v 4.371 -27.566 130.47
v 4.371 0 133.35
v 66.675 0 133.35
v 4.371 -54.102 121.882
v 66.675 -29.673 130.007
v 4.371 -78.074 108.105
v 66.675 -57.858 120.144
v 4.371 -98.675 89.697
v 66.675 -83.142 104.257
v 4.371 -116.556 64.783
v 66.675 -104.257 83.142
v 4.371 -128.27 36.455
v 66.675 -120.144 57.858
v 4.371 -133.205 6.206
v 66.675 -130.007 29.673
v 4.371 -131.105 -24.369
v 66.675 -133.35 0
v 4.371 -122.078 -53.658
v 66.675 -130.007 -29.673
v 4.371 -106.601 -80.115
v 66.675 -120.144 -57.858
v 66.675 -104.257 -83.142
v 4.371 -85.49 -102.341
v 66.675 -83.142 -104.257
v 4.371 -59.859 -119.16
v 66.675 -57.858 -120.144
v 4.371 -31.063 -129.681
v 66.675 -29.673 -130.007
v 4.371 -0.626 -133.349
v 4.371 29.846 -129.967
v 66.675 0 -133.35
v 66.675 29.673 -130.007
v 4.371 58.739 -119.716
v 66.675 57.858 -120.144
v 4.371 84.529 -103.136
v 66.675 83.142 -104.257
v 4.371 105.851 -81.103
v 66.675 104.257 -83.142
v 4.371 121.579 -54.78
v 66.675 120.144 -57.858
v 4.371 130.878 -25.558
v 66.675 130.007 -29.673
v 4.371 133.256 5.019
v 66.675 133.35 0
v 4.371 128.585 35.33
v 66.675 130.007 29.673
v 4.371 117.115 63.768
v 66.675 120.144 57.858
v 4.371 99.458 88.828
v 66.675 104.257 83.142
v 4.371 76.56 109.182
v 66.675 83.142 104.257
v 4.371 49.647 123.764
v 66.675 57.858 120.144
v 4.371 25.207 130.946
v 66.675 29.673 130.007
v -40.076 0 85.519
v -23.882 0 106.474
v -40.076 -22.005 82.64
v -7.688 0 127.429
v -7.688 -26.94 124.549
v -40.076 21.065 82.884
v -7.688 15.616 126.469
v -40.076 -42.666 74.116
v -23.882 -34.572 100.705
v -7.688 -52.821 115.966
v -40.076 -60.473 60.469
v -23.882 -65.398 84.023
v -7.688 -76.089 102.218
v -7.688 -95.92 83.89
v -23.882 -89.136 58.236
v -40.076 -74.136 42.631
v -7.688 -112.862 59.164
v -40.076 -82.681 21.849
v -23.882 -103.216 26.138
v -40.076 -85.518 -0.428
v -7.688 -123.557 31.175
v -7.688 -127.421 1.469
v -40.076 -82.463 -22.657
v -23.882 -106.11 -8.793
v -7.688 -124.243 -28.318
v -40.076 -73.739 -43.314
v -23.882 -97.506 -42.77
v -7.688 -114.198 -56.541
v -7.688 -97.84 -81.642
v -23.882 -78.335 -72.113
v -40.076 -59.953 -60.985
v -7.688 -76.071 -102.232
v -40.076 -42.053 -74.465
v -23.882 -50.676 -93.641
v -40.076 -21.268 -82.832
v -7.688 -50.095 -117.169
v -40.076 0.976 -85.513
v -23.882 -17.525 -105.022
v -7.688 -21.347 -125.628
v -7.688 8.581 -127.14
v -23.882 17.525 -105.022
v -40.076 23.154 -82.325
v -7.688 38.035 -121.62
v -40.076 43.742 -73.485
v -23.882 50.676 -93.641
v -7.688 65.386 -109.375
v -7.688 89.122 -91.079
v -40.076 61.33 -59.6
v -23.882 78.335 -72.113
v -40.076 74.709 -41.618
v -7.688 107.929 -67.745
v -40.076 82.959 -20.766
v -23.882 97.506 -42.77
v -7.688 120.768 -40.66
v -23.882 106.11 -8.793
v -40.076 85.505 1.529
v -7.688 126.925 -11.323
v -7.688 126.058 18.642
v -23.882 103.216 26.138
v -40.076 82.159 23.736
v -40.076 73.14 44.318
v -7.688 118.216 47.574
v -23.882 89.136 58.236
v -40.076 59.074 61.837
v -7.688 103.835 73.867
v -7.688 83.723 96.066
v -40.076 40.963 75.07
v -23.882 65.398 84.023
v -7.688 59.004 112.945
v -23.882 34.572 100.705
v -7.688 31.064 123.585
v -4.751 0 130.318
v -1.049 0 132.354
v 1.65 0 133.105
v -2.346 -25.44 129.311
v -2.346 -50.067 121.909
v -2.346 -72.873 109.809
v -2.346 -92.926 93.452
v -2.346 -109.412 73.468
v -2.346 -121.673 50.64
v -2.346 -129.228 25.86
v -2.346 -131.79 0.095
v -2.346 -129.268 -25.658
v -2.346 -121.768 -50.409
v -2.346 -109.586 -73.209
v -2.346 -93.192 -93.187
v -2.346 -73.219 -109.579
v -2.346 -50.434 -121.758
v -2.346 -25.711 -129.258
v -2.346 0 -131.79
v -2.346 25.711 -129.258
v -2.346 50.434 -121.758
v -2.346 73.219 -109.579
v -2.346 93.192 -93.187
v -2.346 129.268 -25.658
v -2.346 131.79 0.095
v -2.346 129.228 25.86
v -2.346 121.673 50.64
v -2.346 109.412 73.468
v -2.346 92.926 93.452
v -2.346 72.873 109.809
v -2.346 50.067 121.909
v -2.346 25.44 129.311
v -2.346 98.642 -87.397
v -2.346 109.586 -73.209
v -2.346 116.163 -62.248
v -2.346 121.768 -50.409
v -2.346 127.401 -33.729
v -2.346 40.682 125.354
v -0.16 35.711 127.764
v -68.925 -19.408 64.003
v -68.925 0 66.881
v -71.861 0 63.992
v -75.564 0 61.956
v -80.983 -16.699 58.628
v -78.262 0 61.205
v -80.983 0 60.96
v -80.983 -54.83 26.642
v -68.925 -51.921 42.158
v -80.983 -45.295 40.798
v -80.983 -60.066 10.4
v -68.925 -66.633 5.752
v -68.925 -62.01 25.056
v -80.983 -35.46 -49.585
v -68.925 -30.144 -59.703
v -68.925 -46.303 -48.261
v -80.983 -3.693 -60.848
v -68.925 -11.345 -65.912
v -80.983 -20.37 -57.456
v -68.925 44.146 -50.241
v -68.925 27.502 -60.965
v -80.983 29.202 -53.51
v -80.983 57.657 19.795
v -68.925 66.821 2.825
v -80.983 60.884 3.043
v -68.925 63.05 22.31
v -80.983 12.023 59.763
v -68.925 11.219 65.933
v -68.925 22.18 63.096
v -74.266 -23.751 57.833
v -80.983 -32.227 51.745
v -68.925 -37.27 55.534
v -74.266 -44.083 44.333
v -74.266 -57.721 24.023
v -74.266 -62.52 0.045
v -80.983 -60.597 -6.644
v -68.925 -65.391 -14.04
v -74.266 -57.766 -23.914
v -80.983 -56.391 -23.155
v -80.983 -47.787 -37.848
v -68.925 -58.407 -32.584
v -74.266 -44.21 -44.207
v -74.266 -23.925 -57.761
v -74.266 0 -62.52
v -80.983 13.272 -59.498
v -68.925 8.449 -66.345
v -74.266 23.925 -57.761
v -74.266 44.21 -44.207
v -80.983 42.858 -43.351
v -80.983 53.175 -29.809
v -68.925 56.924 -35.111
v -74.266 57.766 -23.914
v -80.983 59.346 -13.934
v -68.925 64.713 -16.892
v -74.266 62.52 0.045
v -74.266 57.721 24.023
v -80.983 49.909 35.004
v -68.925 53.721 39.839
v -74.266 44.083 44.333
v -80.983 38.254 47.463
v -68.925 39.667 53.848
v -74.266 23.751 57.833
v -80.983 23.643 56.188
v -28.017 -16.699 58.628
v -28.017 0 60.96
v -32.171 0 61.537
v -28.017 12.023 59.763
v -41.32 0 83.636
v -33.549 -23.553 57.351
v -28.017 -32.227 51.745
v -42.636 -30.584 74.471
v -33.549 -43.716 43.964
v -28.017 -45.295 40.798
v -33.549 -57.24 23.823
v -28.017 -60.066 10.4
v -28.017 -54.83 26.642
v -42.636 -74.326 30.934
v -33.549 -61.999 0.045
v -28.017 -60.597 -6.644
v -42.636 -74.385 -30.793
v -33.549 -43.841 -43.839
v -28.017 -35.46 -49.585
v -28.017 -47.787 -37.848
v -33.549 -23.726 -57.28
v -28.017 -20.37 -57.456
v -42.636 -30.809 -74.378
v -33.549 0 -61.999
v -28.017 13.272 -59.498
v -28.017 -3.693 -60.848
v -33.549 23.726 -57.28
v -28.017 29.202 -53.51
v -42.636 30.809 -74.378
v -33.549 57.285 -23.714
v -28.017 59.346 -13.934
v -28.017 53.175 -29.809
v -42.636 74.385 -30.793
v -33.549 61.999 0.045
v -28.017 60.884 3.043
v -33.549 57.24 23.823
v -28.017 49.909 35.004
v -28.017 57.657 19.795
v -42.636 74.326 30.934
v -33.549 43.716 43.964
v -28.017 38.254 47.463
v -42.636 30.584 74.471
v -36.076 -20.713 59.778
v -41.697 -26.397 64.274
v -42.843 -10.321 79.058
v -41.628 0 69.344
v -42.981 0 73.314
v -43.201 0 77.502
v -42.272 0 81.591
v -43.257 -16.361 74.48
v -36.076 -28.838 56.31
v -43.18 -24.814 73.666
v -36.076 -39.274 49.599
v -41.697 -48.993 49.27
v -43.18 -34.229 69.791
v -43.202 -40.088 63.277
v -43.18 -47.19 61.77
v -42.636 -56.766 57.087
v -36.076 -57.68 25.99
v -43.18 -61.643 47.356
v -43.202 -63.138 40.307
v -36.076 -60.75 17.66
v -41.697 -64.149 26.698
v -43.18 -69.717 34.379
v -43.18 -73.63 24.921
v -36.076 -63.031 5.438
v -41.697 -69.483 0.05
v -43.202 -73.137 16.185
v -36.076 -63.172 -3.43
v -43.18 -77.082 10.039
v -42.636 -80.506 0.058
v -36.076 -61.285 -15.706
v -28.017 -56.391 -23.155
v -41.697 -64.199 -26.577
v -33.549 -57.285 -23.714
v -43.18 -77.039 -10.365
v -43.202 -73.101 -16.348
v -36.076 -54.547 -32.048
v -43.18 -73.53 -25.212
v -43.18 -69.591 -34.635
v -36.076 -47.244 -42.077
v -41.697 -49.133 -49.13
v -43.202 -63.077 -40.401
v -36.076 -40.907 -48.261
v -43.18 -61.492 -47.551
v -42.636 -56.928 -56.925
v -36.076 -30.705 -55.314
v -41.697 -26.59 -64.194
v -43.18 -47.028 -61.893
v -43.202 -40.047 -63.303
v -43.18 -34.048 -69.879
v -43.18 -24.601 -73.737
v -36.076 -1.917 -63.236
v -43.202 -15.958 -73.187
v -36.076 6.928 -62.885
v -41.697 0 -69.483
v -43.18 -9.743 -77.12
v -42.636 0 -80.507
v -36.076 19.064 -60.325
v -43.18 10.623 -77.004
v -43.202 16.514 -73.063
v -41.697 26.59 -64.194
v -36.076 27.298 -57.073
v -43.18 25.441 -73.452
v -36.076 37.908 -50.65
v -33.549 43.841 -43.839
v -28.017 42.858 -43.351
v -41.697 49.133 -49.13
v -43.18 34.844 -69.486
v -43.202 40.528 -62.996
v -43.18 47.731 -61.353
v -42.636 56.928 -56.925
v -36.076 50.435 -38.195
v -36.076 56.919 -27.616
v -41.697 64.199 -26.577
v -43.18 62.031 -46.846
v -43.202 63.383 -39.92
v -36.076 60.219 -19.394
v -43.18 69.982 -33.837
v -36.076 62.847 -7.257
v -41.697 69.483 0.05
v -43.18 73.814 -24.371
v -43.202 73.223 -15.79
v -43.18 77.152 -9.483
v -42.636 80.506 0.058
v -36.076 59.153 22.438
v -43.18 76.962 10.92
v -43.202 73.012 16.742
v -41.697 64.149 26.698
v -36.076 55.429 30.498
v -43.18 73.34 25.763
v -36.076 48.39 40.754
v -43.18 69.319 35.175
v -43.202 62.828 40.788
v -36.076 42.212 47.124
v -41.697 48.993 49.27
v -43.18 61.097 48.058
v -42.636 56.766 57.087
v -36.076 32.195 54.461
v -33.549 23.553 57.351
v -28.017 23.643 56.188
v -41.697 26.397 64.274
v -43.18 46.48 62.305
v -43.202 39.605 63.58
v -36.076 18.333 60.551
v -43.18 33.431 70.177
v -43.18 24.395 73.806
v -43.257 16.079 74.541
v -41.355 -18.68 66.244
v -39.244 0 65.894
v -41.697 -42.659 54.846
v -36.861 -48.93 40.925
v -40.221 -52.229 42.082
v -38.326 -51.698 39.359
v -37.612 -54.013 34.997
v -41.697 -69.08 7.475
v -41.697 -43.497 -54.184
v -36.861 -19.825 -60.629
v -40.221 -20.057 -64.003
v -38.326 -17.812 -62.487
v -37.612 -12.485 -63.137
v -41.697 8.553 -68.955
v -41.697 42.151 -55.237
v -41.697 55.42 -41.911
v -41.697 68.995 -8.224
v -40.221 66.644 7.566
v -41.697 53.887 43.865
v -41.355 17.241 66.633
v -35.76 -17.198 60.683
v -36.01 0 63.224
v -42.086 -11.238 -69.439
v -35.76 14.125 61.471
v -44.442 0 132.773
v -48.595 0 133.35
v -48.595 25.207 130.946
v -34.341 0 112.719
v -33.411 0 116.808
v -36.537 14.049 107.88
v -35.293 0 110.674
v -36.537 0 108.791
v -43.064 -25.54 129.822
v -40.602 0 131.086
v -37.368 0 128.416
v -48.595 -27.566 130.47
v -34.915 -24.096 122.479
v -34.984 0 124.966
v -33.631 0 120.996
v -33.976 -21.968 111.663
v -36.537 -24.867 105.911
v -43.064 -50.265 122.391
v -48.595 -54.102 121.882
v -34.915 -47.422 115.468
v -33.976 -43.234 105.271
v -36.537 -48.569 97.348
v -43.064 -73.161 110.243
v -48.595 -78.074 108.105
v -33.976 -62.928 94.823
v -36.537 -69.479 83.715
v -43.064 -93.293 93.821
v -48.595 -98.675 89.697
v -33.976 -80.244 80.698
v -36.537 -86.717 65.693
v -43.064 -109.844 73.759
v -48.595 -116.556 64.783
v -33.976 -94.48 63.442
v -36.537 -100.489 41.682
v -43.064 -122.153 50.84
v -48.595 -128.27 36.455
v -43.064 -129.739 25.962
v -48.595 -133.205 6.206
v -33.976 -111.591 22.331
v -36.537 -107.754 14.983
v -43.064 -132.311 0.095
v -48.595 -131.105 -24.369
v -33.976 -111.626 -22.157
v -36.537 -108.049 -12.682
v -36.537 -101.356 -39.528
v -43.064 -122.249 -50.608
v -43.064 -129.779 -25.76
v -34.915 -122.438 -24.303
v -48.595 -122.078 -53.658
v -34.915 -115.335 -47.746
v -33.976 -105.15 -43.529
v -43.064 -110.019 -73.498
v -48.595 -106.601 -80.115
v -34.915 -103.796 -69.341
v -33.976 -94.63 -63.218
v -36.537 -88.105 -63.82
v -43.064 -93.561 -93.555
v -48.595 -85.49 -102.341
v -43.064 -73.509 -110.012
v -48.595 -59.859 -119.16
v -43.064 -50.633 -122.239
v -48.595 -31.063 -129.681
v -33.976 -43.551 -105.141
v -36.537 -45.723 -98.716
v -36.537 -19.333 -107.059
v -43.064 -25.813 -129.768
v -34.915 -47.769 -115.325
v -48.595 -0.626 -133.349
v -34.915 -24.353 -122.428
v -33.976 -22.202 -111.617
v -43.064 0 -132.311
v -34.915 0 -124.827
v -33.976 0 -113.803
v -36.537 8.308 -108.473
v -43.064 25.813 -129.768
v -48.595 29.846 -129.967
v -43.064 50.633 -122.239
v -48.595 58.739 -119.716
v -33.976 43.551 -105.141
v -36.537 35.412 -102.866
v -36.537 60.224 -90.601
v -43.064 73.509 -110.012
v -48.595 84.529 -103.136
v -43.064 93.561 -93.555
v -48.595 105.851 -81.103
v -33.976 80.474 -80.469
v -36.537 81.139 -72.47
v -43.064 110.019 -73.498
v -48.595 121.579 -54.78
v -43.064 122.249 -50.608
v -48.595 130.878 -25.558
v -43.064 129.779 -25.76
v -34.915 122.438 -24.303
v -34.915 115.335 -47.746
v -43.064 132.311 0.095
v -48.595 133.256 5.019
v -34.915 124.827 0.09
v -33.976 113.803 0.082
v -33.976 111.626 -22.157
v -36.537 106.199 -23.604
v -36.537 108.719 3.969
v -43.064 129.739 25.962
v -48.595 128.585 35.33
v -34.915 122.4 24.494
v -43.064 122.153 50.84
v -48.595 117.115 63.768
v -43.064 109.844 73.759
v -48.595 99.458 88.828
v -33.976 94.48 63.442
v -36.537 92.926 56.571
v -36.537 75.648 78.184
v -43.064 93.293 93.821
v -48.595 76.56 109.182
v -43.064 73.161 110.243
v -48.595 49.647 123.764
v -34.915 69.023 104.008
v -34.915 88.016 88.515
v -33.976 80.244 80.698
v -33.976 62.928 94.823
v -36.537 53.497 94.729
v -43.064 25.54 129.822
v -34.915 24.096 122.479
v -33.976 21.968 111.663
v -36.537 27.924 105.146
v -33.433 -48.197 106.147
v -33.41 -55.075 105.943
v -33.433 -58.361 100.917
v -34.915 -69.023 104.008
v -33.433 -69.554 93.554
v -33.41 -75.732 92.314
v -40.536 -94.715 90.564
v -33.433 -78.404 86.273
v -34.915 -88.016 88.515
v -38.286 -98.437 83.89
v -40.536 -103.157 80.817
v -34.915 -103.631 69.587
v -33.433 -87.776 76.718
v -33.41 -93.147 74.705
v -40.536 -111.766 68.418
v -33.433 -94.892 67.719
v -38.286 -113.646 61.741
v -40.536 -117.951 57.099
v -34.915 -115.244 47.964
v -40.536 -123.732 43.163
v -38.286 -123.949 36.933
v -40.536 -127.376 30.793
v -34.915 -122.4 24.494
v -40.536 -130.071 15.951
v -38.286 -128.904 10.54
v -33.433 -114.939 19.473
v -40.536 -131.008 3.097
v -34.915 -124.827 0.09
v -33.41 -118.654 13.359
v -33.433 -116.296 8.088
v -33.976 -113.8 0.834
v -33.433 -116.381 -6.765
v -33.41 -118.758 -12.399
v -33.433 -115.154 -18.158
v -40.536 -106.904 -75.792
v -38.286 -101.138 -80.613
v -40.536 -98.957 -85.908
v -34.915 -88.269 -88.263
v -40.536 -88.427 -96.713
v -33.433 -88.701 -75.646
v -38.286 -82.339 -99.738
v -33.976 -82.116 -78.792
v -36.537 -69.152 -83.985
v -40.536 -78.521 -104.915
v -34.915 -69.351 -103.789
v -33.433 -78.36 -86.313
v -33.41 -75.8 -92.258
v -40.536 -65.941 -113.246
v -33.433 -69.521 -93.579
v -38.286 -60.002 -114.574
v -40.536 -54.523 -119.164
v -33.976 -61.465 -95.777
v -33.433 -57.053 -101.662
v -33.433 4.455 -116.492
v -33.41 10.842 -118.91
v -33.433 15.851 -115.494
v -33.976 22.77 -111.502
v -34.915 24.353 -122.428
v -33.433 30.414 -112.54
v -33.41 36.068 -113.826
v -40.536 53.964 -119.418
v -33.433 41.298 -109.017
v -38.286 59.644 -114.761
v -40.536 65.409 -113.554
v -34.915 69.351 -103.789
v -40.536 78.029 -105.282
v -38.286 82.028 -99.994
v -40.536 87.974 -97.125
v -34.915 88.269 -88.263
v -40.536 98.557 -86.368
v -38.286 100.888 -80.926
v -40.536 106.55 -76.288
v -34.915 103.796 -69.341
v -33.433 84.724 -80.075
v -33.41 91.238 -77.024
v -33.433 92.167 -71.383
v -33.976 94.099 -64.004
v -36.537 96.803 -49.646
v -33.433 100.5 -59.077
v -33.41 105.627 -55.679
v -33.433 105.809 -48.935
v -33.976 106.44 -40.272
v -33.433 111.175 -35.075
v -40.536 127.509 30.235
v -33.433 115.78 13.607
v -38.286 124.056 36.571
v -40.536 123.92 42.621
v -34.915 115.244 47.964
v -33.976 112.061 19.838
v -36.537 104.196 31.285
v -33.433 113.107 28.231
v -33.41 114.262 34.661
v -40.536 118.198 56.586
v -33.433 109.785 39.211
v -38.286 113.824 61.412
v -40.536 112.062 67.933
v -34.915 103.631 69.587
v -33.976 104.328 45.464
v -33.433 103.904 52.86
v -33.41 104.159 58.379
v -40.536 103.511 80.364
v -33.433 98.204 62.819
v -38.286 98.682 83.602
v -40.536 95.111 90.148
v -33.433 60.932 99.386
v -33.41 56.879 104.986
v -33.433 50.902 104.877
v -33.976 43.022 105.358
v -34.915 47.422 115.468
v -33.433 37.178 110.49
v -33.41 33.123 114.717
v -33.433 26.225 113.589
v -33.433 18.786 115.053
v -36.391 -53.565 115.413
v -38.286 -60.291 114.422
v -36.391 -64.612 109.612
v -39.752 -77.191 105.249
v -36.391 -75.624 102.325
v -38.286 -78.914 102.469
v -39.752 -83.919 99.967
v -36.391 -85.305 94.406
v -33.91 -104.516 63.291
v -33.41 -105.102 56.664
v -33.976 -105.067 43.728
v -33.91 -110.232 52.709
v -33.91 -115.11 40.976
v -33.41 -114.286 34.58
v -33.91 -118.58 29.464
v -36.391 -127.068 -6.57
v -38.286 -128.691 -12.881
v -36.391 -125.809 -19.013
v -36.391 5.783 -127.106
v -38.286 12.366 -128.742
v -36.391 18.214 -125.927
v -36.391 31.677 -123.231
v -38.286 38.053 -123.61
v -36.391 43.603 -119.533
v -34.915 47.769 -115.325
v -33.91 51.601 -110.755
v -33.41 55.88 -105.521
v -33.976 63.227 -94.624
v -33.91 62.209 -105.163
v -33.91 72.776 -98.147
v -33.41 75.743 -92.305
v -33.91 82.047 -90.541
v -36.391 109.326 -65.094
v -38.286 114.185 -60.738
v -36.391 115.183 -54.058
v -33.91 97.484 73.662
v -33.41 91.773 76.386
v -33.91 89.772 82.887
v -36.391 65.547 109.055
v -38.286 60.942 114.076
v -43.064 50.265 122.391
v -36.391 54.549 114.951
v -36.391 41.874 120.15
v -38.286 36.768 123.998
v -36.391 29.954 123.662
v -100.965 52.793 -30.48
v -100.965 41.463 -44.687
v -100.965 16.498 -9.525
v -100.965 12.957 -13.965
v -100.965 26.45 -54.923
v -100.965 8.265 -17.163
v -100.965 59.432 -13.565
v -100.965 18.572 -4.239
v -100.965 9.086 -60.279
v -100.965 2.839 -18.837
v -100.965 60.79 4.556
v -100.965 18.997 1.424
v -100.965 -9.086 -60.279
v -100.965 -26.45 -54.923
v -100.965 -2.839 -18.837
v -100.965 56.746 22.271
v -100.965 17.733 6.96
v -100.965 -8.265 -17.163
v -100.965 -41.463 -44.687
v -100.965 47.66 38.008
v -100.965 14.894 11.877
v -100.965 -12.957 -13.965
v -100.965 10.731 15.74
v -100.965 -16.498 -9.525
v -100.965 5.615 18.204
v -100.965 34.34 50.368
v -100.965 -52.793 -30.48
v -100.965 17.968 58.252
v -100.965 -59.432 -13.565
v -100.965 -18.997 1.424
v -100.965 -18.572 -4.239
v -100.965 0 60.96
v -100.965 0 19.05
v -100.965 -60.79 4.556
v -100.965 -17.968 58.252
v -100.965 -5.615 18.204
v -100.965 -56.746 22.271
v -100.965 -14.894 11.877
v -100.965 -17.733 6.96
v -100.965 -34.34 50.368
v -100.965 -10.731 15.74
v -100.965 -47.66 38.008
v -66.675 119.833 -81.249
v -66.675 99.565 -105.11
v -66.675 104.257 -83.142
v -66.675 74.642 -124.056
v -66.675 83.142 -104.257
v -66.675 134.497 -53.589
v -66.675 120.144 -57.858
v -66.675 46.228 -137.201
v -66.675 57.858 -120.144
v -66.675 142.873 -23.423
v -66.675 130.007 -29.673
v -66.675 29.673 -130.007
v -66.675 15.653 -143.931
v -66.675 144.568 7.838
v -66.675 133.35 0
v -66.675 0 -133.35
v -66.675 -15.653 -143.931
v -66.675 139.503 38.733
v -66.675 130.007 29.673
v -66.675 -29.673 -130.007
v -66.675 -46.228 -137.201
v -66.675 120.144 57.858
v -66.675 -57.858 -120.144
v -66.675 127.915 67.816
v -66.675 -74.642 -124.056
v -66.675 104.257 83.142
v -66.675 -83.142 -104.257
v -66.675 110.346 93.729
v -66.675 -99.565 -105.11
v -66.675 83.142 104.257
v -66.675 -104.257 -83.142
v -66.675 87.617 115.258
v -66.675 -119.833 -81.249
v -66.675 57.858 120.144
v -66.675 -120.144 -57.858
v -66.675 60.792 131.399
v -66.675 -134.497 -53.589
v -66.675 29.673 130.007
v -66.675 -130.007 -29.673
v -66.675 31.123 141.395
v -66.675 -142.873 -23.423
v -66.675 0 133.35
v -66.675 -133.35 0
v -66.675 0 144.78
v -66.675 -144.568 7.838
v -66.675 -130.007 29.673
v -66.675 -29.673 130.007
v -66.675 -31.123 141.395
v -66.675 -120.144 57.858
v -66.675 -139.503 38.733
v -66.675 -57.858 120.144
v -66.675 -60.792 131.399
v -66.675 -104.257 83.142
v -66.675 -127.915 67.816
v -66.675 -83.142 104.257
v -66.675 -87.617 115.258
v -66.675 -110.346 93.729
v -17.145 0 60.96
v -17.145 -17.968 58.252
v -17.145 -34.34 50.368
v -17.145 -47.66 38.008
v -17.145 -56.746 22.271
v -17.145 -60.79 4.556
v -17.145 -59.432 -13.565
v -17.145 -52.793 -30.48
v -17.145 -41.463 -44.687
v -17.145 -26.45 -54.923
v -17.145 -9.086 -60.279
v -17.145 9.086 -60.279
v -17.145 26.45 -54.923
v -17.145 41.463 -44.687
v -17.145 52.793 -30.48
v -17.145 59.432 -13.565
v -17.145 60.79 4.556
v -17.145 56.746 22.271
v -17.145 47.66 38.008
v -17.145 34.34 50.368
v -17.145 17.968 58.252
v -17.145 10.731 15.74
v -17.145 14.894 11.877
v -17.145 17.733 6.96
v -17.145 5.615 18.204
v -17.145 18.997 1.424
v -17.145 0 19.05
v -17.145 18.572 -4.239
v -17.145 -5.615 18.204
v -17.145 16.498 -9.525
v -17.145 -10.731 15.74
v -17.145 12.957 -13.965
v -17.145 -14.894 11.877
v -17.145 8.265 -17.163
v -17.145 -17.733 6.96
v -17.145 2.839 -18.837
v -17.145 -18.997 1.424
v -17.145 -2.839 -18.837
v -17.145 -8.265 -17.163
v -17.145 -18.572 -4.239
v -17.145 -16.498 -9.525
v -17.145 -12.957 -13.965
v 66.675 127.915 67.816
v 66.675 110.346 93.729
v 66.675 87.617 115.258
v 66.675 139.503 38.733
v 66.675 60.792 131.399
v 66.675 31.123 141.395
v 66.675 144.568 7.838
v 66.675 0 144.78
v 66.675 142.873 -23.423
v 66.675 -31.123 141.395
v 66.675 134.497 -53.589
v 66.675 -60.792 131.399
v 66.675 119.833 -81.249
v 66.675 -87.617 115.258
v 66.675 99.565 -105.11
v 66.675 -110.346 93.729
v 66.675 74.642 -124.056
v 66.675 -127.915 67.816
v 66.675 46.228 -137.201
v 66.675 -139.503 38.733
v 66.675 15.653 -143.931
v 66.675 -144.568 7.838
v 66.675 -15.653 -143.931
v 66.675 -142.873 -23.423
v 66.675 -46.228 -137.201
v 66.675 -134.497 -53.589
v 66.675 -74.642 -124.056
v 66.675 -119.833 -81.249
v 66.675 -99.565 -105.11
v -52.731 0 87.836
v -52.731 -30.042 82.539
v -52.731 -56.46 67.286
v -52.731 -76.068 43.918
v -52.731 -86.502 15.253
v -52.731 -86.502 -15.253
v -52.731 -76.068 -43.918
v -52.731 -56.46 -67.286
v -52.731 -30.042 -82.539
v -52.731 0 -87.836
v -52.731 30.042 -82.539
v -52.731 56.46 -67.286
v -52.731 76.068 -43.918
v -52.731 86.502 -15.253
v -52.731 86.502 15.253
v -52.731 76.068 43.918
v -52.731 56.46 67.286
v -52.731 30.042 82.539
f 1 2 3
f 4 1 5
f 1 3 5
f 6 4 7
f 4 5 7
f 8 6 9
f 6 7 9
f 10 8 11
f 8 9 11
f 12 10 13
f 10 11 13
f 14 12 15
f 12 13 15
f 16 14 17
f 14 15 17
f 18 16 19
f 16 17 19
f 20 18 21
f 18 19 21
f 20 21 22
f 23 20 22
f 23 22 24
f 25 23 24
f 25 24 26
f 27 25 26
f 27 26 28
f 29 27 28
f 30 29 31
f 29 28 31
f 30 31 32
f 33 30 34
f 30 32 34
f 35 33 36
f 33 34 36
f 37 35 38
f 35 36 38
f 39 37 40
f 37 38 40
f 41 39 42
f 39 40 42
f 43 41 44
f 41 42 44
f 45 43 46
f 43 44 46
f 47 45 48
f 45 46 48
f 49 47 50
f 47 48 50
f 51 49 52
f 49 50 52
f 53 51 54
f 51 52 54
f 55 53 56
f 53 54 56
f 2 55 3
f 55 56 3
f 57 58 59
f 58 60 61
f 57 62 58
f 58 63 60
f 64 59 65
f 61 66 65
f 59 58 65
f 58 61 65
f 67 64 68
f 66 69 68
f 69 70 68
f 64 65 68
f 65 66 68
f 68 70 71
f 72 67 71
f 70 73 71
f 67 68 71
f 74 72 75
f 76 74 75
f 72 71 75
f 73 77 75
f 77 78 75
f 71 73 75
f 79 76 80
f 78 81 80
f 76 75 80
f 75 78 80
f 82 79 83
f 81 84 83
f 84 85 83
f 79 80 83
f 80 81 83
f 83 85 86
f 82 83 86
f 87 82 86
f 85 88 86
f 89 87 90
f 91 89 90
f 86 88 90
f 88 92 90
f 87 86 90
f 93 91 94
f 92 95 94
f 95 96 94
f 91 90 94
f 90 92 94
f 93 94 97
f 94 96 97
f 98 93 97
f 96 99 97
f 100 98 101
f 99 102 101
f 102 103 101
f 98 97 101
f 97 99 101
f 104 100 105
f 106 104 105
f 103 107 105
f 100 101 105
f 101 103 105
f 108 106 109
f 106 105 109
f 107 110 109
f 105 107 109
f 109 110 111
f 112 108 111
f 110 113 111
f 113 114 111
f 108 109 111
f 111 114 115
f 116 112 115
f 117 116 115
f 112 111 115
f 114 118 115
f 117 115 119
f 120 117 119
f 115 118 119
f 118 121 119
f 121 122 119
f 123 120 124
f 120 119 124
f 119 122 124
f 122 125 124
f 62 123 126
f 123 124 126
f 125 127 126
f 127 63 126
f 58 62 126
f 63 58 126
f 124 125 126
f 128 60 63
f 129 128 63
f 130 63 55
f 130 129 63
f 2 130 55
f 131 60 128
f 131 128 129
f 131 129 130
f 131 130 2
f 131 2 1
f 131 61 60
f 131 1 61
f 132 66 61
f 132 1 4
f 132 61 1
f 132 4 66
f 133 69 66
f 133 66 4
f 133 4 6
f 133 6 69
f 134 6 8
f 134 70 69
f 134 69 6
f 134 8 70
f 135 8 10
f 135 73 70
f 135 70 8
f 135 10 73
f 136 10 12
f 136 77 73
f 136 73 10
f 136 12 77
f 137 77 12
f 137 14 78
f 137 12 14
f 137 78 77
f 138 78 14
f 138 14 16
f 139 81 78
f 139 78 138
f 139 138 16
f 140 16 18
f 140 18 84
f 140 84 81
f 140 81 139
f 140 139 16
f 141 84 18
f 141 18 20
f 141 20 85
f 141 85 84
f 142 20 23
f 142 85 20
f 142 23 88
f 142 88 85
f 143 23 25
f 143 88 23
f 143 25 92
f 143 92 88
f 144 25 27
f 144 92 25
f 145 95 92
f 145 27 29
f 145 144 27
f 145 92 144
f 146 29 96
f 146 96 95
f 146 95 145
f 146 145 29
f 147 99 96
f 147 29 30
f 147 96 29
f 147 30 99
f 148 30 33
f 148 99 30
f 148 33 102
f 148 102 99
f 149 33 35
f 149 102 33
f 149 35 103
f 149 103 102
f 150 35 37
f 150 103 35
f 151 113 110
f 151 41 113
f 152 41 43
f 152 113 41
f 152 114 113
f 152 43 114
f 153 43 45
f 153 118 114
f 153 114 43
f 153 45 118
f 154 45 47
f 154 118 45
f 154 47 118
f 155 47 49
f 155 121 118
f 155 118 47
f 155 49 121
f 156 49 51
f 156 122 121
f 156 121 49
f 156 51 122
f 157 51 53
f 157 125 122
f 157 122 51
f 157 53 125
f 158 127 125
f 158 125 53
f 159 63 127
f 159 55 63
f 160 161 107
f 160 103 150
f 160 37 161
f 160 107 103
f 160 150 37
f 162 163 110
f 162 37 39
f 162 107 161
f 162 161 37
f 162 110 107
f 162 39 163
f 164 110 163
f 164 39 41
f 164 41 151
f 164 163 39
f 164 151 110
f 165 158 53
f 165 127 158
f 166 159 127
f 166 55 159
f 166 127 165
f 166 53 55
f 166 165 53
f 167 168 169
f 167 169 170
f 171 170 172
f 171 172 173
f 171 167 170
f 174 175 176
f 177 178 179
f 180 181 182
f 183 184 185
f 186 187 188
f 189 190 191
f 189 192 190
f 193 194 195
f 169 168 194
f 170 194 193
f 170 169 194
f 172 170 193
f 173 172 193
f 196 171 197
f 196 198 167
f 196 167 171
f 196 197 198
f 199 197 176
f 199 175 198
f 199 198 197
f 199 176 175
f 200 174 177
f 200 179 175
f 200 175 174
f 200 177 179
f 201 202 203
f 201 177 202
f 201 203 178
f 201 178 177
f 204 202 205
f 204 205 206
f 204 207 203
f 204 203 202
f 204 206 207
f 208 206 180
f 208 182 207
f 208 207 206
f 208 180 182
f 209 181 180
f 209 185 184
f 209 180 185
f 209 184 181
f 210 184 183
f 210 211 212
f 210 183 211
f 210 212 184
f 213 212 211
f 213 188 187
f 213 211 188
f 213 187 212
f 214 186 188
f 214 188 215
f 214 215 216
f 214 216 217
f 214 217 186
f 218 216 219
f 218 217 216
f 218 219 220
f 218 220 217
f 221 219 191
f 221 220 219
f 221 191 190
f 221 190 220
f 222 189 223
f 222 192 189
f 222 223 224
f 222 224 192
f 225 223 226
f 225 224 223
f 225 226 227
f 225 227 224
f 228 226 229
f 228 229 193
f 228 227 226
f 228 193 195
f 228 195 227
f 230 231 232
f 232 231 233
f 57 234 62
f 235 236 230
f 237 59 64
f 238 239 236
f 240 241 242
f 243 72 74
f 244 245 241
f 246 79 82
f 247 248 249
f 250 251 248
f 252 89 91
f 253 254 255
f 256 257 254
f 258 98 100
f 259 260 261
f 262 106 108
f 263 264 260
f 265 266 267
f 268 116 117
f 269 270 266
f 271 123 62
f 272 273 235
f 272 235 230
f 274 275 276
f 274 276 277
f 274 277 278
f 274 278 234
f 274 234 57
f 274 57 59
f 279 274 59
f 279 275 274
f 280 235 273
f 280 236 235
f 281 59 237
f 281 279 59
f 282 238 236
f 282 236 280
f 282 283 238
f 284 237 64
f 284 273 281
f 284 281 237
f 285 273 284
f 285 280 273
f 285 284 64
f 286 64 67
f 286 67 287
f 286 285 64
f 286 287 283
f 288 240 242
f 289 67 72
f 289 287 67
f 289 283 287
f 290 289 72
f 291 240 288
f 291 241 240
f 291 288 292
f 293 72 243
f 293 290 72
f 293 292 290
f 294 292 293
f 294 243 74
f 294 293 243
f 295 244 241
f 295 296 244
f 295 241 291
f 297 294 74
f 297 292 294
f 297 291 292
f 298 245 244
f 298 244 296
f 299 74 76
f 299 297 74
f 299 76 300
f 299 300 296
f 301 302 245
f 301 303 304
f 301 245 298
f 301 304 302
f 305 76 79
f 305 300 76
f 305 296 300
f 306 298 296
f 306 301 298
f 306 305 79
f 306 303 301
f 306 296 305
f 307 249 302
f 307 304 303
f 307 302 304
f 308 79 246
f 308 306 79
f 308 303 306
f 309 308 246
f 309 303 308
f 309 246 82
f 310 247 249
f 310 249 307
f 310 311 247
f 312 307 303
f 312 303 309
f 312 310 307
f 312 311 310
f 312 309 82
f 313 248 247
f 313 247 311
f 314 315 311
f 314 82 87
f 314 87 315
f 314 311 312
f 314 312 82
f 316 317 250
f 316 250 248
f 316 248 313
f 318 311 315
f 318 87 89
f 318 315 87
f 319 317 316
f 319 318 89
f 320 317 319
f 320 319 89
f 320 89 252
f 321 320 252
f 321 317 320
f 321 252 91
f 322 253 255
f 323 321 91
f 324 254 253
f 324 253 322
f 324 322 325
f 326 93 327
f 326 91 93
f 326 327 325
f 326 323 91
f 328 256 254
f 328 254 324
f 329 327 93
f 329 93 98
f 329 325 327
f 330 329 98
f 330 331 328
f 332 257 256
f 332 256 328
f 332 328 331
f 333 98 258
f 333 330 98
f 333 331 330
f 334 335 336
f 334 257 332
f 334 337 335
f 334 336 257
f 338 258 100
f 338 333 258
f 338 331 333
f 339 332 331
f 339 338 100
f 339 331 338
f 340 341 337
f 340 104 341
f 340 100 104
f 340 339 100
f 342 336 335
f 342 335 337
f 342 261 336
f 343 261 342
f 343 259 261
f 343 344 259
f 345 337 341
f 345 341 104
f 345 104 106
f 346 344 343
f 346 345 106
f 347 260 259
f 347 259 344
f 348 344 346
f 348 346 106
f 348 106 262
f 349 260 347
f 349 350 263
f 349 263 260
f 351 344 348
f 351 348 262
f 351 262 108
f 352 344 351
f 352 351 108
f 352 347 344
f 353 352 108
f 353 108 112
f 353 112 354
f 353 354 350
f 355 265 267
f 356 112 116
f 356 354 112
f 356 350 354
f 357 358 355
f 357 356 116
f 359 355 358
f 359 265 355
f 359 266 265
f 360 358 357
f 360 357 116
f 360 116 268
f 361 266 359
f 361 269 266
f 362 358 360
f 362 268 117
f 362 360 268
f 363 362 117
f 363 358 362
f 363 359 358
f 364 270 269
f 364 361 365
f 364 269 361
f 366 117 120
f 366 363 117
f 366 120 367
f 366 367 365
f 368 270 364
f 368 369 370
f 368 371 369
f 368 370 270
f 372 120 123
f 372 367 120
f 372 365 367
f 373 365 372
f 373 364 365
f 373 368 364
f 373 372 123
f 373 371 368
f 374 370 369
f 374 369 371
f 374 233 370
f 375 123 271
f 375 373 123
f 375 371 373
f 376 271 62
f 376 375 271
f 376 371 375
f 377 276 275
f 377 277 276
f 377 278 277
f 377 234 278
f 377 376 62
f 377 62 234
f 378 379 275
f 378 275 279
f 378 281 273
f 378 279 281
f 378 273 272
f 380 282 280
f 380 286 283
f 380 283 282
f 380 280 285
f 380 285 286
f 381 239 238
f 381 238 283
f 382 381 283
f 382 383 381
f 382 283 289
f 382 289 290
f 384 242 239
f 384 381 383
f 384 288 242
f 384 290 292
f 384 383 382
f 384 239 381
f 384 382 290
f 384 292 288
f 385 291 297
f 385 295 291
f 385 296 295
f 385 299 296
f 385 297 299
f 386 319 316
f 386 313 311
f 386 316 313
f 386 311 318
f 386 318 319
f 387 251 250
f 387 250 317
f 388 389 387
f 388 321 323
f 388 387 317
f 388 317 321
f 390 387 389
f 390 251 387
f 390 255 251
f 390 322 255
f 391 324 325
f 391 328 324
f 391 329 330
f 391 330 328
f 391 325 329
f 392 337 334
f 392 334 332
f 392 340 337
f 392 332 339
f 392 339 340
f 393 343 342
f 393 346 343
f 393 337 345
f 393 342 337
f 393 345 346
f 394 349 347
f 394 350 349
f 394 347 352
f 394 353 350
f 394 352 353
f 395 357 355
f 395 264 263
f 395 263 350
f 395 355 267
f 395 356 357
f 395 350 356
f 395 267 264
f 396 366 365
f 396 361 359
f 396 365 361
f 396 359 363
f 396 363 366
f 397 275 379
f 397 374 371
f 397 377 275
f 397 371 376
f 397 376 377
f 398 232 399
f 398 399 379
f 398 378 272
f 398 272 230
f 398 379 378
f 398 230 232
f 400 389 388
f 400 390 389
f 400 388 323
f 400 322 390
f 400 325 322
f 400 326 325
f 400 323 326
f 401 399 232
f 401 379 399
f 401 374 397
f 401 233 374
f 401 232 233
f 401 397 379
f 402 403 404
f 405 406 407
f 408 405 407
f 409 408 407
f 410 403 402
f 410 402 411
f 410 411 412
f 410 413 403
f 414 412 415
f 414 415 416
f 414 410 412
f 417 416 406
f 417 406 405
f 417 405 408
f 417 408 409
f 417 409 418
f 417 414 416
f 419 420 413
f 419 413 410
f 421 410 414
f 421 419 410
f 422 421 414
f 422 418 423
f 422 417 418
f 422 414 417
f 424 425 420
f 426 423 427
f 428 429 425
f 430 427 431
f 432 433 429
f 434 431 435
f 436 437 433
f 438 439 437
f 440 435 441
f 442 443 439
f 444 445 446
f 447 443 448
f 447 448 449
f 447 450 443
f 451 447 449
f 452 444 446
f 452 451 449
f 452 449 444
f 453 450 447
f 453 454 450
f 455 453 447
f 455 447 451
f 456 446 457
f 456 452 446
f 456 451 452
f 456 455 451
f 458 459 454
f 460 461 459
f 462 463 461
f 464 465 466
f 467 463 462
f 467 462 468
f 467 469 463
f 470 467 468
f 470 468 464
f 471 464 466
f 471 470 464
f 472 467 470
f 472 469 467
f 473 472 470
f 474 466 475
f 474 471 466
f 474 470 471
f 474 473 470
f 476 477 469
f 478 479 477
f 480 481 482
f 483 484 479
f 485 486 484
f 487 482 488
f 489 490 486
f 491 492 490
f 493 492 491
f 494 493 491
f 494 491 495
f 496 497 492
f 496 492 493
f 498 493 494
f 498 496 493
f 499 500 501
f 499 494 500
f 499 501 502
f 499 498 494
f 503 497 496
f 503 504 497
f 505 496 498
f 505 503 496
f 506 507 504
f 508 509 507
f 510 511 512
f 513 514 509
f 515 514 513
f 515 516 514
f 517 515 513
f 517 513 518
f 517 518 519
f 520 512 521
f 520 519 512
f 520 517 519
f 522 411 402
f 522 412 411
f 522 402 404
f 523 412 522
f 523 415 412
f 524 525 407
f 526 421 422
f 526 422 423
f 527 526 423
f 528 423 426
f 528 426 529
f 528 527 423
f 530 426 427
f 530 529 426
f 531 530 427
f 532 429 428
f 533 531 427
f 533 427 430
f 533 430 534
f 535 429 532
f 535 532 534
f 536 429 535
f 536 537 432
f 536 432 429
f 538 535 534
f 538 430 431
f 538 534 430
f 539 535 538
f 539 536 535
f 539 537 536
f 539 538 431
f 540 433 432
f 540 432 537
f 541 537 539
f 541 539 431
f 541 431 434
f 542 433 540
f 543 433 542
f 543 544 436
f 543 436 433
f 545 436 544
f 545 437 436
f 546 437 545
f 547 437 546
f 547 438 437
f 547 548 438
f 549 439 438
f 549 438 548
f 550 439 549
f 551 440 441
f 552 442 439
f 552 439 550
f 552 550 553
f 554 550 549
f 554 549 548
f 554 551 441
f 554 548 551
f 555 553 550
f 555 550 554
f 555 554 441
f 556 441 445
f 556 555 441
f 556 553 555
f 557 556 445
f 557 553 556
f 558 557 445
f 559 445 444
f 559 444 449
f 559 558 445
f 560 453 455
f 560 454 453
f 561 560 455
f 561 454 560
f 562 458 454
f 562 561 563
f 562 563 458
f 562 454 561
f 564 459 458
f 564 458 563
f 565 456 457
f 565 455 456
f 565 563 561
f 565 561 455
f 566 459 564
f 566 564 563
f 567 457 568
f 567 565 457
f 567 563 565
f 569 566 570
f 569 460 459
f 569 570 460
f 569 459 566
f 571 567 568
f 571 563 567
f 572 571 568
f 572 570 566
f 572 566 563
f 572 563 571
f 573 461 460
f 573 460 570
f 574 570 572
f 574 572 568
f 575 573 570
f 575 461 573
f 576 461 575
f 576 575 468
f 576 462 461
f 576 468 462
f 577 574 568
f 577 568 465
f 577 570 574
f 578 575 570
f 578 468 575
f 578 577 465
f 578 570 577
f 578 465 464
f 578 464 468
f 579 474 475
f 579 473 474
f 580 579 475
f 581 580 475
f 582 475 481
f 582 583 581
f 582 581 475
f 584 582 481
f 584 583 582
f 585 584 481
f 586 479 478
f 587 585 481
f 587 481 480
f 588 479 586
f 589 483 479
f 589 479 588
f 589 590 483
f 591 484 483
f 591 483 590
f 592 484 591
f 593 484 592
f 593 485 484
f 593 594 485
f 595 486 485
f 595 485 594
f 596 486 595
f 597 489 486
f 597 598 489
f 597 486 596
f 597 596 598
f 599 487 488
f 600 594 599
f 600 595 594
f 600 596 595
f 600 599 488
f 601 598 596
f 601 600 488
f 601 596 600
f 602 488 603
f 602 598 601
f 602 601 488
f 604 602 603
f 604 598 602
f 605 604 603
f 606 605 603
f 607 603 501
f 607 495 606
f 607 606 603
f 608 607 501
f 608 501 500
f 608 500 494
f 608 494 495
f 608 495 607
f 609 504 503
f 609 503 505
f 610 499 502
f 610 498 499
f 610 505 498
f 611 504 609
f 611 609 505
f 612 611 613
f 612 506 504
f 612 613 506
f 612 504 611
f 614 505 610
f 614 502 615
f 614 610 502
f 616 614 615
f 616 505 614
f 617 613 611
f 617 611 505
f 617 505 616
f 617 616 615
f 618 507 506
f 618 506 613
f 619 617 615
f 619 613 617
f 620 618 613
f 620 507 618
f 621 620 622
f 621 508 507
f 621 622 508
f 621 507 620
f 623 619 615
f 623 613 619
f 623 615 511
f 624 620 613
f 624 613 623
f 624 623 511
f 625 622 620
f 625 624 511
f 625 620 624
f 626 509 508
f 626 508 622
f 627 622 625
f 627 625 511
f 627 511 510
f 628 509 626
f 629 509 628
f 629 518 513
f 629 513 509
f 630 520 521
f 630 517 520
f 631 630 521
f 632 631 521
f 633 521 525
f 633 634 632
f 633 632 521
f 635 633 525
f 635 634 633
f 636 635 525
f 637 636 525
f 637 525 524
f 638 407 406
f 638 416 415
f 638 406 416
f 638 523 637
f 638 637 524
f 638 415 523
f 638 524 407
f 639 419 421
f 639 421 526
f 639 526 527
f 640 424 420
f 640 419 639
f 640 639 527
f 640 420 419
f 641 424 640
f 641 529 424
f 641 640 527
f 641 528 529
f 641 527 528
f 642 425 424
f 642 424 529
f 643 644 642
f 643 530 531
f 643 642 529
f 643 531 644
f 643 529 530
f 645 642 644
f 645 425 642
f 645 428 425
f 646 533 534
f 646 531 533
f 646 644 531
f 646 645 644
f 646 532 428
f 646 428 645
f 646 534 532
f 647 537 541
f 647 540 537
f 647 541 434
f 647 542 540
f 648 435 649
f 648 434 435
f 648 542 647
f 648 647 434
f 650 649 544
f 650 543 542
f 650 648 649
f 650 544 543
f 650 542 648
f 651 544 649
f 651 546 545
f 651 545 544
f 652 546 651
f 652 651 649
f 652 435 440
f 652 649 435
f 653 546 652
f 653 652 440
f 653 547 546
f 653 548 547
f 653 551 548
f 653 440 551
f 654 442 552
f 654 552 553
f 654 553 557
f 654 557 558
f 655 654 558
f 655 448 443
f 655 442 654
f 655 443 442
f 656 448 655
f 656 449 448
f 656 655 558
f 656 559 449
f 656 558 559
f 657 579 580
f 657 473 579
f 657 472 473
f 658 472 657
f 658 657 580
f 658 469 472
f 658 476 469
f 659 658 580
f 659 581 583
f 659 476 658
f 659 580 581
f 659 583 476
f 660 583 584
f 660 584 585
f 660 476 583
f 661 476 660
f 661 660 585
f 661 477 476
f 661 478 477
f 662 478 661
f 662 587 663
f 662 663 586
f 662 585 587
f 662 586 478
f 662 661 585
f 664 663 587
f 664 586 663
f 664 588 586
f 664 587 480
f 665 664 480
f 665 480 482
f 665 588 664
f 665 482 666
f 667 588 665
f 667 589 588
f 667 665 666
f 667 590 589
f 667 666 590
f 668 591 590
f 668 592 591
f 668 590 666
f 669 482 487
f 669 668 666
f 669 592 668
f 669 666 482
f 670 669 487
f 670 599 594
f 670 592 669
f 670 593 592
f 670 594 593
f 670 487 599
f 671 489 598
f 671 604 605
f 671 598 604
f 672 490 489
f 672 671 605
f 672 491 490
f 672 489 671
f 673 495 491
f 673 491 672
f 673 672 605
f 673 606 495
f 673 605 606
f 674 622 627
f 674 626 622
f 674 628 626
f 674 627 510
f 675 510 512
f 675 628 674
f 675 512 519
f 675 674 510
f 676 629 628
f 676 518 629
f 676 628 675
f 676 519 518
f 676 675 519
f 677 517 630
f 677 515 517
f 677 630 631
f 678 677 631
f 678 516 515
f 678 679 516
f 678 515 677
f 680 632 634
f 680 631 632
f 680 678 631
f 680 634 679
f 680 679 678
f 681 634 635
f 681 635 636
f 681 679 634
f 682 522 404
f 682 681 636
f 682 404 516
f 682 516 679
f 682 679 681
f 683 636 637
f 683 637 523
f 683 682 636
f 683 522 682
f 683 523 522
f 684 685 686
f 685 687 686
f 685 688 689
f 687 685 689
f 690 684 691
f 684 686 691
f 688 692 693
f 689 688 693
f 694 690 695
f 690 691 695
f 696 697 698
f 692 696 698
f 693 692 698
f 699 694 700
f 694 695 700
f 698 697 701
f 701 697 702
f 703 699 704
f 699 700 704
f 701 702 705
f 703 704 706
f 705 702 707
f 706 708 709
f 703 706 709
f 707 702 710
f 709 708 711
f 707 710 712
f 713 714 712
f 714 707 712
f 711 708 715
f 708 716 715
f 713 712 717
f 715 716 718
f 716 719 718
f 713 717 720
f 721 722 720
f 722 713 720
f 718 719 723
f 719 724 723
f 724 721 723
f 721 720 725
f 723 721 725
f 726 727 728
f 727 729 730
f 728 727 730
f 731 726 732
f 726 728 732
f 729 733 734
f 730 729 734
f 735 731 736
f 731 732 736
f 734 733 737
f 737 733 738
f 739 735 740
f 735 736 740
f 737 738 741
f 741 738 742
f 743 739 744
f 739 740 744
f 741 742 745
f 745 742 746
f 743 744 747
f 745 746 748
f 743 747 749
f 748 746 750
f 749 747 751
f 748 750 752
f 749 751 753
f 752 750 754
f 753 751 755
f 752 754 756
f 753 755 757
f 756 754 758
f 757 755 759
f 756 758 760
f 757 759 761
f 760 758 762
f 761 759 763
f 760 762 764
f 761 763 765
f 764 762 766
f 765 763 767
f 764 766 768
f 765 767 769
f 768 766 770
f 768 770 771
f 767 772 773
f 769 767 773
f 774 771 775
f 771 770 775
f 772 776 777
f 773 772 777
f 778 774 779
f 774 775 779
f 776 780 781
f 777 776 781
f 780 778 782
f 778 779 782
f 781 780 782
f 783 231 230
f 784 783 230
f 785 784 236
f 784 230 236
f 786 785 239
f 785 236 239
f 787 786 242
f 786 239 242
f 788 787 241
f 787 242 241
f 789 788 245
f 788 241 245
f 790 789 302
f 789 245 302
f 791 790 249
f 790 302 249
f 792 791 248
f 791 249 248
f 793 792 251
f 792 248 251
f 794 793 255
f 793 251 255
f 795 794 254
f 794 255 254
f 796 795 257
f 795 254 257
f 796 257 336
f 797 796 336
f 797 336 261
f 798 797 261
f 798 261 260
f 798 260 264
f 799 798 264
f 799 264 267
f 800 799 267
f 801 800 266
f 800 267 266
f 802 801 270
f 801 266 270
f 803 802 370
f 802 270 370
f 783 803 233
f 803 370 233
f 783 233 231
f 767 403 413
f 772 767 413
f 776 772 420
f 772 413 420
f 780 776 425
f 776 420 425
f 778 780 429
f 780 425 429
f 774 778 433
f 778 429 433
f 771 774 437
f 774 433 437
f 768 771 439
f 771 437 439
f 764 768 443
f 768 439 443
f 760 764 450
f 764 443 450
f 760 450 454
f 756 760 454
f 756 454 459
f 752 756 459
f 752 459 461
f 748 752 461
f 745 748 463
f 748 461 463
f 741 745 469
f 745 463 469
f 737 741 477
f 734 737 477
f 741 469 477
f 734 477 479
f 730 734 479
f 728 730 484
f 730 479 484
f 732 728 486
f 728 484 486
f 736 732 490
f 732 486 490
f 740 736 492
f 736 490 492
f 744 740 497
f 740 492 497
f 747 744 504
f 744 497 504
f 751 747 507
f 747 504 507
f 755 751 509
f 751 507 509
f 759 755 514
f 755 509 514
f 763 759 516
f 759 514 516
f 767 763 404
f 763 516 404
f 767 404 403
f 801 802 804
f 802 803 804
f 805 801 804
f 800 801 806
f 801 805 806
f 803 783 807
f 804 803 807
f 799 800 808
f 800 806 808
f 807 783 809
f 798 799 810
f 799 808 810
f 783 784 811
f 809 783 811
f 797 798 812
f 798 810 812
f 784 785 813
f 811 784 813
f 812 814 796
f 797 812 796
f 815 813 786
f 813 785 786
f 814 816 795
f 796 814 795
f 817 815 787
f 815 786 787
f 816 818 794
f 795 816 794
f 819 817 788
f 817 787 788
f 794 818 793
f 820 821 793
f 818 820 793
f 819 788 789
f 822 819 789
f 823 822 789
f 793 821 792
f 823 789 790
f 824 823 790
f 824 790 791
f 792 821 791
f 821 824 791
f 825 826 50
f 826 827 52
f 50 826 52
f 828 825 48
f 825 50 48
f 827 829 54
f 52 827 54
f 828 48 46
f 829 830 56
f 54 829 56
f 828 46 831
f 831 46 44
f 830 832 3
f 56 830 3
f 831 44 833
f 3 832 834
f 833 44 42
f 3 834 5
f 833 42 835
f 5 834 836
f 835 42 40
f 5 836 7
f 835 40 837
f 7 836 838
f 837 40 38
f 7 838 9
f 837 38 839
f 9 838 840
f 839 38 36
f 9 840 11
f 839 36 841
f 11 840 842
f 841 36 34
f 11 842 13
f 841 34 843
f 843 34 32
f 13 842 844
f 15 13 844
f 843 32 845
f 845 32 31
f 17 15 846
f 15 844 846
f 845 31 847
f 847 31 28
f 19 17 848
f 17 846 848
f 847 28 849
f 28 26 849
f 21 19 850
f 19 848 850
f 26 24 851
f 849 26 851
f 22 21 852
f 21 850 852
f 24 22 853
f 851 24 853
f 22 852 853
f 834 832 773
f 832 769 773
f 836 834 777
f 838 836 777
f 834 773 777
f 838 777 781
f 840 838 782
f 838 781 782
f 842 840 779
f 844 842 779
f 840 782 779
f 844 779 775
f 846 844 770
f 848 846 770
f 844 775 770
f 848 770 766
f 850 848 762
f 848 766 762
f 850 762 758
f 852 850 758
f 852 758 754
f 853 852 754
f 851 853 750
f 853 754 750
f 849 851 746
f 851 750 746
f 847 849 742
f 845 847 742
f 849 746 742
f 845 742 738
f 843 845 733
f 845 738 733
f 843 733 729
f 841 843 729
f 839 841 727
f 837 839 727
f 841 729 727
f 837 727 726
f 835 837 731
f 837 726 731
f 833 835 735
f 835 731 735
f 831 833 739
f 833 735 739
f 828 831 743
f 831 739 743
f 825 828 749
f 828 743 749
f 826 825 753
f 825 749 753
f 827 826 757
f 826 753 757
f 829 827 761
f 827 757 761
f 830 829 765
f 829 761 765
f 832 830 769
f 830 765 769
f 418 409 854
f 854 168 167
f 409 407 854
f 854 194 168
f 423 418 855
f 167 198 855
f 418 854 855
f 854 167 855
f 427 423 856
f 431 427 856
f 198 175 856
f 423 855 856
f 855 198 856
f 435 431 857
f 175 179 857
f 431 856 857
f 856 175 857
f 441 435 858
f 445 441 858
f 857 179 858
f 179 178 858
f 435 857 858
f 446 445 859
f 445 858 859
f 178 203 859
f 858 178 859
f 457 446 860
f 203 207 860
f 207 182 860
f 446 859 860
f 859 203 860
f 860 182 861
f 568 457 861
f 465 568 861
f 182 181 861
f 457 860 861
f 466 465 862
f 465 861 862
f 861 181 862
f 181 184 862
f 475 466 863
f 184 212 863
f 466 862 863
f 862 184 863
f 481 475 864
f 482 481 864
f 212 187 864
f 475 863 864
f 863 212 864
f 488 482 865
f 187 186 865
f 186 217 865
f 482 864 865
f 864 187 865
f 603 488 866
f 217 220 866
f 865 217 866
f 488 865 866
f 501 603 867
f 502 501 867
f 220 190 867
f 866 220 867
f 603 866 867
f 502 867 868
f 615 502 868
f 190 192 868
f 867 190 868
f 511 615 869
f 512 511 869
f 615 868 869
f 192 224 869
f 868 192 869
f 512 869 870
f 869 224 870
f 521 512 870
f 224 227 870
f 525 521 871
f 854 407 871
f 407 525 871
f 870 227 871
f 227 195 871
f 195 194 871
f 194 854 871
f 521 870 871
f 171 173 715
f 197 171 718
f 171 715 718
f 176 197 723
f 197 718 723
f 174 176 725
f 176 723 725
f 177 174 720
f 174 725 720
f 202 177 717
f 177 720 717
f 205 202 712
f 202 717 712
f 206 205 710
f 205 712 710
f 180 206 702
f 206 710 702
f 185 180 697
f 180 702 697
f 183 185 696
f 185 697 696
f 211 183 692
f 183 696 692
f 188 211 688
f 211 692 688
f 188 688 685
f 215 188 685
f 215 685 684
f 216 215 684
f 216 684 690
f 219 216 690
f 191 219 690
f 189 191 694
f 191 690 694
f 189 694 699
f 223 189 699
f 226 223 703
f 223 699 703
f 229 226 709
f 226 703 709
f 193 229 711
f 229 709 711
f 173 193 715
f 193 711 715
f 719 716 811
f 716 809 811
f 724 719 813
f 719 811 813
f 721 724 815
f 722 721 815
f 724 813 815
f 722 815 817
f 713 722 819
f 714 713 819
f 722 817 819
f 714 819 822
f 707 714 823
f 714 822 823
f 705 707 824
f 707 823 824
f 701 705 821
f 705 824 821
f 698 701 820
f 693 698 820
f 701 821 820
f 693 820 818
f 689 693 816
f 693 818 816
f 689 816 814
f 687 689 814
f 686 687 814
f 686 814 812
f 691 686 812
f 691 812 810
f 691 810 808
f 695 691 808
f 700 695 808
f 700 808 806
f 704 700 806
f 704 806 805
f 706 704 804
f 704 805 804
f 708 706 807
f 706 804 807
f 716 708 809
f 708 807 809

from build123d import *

# Parameters (mm, degrees)
F2_R     = 25.4
F3_SCALE = 0.6


with BuildPart() as f1:
    # F0 (on Front) → F1 (revolve)
    with BuildSketch(Plane.XZ):
        Polygon((111.125, 222.25), (111.125, 241.3), (-111.125, 241.3), (-111.125, 222.25), (-29.2621003771, 222.25), (-5.1864683628, 222.25), align=None)
        Polygon((-98.425, 101.6), (-5.1864683628, 222.25), (-29.2621003771, 222.25), (-122.5006320143, 101.6), align=None)
        Polygon((-28.575, 101.6), (-98.425, 101.6), (-122.5006320143, 101.6), (-168.275, 101.6), (-168.275, 31.75), (-28.575, 31.75), align=None)
    revolve(axis=Axis((-5.1864683628, 0, 0), (1, 0, 0)))

    # F2
    f2_edges = [f1.edges().sort_by_distance(p)[0] for p in [
        (-98.425, 0, -101.6),
        (-5.186468, 0, -222.25),
        (-51.805734, 0, 161.925),
        (-29.2621, 0, -222.25),
        (-122.500632, 0, -101.6),
        (-75.881366, 0, 161.925),
    ]]
    fillet(f2_edges, radius=F2_R)


with BuildPart() as f1_1:
    # F3: moved
    add(f1.part.scale(F3_SCALE))


solid = f1_1.part
